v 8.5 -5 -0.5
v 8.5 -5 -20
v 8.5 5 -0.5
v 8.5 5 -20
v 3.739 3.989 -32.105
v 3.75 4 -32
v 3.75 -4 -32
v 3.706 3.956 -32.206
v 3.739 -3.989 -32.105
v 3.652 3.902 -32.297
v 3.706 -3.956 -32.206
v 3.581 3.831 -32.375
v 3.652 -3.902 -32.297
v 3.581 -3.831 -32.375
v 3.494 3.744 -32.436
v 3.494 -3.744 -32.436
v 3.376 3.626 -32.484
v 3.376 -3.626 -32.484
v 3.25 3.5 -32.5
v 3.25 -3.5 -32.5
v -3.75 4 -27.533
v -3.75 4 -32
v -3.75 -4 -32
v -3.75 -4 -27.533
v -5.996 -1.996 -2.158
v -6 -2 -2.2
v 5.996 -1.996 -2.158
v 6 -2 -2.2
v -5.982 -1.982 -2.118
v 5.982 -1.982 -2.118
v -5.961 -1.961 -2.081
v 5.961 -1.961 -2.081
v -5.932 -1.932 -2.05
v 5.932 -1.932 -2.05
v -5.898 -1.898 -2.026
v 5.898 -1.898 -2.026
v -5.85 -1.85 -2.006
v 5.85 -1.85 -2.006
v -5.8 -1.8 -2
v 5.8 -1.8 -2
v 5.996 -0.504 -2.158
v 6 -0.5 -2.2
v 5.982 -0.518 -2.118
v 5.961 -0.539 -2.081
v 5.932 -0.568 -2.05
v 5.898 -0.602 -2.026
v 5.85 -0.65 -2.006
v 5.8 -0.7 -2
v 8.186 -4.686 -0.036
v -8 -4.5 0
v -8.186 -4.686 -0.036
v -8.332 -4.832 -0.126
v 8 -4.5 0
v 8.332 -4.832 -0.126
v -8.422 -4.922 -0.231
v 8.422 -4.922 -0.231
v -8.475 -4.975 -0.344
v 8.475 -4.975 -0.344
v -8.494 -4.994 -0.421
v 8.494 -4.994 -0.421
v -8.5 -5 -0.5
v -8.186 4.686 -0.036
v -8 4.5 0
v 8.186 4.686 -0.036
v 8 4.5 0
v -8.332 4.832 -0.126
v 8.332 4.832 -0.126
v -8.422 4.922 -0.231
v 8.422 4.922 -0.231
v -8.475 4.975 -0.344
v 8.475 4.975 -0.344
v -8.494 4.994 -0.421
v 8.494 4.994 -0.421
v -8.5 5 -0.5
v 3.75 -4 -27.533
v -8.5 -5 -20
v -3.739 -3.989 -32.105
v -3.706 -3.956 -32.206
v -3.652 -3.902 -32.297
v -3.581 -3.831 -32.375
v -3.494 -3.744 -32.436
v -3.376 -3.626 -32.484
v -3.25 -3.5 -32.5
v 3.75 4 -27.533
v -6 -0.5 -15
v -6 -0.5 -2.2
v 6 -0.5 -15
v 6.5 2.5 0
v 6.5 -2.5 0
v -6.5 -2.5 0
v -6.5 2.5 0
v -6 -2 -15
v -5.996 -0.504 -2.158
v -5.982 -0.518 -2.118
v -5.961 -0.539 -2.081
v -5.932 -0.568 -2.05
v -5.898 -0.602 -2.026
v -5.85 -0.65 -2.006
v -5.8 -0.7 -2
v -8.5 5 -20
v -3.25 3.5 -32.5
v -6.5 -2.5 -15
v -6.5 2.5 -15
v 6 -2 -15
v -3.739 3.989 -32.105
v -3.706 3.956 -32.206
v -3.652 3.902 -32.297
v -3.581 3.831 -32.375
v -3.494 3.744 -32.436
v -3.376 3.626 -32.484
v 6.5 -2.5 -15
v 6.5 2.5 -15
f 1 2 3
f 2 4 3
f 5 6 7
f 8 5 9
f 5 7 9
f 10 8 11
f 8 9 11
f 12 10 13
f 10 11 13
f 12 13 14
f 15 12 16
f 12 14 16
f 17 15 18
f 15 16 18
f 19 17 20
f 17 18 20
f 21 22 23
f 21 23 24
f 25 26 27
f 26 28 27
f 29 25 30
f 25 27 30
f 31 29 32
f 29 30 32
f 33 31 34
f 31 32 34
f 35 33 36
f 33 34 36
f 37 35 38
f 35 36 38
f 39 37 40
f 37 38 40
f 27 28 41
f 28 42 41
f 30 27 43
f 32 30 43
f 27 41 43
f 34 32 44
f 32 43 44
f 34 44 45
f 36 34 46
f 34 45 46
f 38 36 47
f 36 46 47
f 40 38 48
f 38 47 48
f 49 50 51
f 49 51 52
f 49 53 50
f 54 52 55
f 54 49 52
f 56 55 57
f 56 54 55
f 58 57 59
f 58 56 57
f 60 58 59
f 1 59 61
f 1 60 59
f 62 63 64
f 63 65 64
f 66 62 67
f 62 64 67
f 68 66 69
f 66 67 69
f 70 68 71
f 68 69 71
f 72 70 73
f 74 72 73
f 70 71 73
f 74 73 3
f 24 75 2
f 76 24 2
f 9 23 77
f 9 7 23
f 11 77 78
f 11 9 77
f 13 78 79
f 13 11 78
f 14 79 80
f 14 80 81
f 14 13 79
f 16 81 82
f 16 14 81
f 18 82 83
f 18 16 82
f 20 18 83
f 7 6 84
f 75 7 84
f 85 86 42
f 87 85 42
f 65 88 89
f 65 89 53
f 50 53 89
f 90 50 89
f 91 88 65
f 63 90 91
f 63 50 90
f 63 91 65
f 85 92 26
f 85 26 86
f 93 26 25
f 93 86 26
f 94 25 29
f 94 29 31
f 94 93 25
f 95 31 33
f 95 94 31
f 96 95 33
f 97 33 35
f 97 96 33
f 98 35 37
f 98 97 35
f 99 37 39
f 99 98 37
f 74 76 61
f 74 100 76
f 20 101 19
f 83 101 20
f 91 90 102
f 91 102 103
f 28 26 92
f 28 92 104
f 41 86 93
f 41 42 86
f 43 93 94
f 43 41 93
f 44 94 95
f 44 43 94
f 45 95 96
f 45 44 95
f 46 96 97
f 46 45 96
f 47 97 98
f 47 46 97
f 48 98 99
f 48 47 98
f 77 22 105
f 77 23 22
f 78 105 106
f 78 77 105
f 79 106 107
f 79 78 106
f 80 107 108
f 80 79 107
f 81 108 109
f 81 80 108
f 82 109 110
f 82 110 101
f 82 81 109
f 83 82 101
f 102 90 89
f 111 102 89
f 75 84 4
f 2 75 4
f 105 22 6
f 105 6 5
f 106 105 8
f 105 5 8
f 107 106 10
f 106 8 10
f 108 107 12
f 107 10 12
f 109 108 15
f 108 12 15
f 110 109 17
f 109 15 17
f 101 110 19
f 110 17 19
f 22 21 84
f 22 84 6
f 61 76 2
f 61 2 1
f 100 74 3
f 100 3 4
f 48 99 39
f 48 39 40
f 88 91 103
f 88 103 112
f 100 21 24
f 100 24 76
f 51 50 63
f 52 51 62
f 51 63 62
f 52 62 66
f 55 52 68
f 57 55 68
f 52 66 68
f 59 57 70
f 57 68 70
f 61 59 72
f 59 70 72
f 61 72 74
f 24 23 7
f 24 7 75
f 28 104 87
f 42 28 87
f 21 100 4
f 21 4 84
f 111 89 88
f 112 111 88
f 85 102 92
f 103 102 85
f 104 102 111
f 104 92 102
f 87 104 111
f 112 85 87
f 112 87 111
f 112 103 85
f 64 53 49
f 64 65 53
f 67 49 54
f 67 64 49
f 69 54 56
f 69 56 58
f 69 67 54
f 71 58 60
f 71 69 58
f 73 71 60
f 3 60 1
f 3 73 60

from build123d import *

# Parameters (mm, degrees)
EXTRUDE_1_DEPTH      = 8.5
EXTRUDE_1_DEPTH_BACK = 8.5
CUT_EXTRUDE_3_DEPTH  = 36.049964337
FILLET_3_R           = 0.5
SKETCH_3_W           = 13
SKETCH_3_H           = 5
CUT_EXTRUDE_1_DEPTH  = 15
SKETCH_4_W           = 12
SKETCH_4_H           = 1.5
EXTRUDE_2_DEPTH      = 13
FILLET_2_R           = 0.2


with BuildPart() as part:
    # 草图2 → 凸台-拉伸1 (new, two sides: drawn at the far end of the back side and taken through both)
    with BuildSketch(Plane(origin=(0, 0, 0), x_dir=(0, 0, -1), z_dir=(1, 0, 0)).offset(-EXTRUDE_1_DEPTH_BACK)):
        Polygon((0, -5), (0, 5), (20, 5), (27.532919446, 4), (32.5, 4), (32.5, -4), (27.532919446, -4), (20, -5), align=None)
    extrude(amount=EXTRUDE_1_DEPTH + EXTRUDE_1_DEPTH_BACK)

    # 草图5 → 切除-拉伸3 (cut, through all)
    with BuildSketch(Plane(origin=(0, 5, 0), x_dir=(1, 0, 0), z_dir=(0, 1, 0))):
        Polygon((-3.75, 32.5), (-3.75, 27.532919446), (-8.5, 20), (-8.5, 32.5), align=None)
        Polygon((8.5, 32.5), (3.75, 32.5), (3.75, 27.532919446), (8.5, 20), align=None)
    extrude(amount=-CUT_EXTRUDE_3_DEPTH, mode=Mode.SUBTRACT)

    # 圆角3
    fillet_3_edges = [part.edges().sort_by_distance(p)[0] for p in [
        (0, -5, 0),
        (0, 5, 0),
        (8.5, 0, 0),
        (0, -4, -32.5),
        (0, 4, -32.5),
        (-3.75, 0, -32.5),
        (-8.5, 0, 0),
        (3.75, 0, -32.5),
    ]]
    fillet(fillet_3_edges, radius=FILLET_3_R)

    # 草图3 → 切除-拉伸1 (cut)
    with BuildSketch(Plane.XY):
        Rectangle(SKETCH_3_W, SKETCH_3_H)
    extrude(amount=-CUT_EXTRUDE_1_DEPTH, mode=Mode.SUBTRACT)

    # 草图4 → 凸台-拉伸2 (add)
    with BuildSketch(Plane.XY.offset(-15)):
        with Locations((0, -1.25)):
            Rectangle(SKETCH_4_W, SKETCH_4_H)
    extrude(amount=EXTRUDE_2_DEPTH)

    # 圆角2
    fillet_2_edges = [part.edges().sort_by_distance(p)[0] for p in [
        (0, -0.5, -2),
        (-6, -1.25, -2),
        (0, -2, -2),
        (6, -1.25, -2),
    ]]
    fillet(fillet_2_edges, radius=FILLET_2_R)


solid = part.part
